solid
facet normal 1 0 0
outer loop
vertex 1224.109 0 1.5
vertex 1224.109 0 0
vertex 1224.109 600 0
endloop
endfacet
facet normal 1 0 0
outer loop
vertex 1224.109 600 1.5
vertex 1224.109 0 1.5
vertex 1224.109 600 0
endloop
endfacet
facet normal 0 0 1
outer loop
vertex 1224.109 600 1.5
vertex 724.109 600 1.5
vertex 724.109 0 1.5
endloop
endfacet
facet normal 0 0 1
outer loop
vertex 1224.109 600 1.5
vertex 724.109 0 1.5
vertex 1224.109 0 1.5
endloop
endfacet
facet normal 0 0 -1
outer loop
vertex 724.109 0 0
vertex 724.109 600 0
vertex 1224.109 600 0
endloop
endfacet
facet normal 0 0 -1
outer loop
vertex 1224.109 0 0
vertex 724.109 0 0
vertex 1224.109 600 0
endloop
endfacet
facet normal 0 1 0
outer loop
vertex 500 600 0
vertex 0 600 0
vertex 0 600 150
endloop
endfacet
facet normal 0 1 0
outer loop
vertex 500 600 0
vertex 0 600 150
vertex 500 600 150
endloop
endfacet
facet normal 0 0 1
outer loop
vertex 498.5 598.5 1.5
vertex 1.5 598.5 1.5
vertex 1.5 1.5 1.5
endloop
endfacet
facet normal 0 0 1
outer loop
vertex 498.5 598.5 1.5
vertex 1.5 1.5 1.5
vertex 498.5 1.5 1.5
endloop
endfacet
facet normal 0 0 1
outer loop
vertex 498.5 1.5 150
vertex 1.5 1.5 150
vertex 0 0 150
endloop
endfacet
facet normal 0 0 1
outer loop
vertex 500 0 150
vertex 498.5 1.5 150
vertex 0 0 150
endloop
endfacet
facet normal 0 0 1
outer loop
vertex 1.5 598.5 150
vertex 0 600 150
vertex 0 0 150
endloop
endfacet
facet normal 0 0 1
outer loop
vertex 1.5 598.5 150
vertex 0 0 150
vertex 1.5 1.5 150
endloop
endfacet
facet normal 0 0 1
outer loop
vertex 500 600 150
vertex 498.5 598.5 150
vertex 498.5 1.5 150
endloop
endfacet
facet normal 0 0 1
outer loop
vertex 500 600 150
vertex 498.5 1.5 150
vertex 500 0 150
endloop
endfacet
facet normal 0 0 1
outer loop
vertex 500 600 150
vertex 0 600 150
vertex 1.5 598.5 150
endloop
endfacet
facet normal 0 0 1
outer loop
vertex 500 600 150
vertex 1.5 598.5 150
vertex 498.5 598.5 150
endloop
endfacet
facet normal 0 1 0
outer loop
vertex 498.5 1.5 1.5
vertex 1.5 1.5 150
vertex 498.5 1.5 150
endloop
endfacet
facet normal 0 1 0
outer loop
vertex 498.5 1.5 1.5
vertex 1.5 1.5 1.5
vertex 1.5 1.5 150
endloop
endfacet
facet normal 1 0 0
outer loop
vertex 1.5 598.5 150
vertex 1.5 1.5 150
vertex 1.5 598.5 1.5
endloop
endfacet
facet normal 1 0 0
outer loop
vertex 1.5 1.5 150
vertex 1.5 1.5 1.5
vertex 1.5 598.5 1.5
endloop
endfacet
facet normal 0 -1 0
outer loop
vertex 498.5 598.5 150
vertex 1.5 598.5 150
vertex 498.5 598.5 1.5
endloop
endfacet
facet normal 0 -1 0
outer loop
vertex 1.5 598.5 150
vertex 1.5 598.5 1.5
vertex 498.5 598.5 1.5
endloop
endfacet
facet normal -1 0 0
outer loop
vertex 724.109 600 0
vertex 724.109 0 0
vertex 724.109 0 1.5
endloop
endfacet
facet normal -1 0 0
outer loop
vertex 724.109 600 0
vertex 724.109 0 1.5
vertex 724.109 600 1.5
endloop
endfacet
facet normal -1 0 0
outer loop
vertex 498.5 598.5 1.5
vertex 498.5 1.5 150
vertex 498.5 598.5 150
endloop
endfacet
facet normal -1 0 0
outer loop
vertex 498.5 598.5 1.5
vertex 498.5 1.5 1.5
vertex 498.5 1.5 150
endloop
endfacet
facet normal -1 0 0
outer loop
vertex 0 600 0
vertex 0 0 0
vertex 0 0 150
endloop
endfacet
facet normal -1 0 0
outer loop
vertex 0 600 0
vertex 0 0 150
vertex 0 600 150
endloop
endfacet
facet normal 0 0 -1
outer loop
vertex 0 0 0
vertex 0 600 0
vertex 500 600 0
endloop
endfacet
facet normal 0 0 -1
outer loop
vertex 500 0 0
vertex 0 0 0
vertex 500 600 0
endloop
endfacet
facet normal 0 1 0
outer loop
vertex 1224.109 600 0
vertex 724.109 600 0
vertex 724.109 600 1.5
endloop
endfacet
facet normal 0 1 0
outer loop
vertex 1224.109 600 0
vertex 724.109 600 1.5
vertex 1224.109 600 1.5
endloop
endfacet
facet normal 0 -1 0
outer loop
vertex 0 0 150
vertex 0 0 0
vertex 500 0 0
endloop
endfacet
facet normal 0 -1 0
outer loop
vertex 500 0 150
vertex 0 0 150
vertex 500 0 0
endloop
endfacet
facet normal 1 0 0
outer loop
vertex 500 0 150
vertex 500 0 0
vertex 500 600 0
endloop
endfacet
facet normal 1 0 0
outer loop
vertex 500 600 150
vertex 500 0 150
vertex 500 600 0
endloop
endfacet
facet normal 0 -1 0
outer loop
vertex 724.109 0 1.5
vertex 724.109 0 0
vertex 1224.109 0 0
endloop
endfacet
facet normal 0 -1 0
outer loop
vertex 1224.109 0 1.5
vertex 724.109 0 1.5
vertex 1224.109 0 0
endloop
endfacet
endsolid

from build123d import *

# Parameters (mm, degrees)
F0_W     = 500
F0_H     = 600
F1_DEPTH = 150
F2_T     = -1.5
F3_DEPTH = 1.5


with BuildPart() as f1:
    # F0 (on Top) → F1 (new body)
    with BuildSketch(Plane.XY):
        with Locations((250, 300)):
            Rectangle(F0_W, F0_H)
    extrude(amount=F1_DEPTH)

    # F2
    f2_openings = [f1.faces().sort_by_distance(p)[0] for p in [
        (250, 300, 150),
    ]]
    offset(amount=F2_T, openings=f2_openings)


with BuildPart() as f3:
    # F0 (on Top) → F3 (new body)
    with BuildSketch(Plane.XY):
        with Locations((974.108815, 300)):
            Rectangle(F0_W, F0_H)
    extrude(amount=F3_DEPTH)


solid = Compound([f1.part, f3.part])
